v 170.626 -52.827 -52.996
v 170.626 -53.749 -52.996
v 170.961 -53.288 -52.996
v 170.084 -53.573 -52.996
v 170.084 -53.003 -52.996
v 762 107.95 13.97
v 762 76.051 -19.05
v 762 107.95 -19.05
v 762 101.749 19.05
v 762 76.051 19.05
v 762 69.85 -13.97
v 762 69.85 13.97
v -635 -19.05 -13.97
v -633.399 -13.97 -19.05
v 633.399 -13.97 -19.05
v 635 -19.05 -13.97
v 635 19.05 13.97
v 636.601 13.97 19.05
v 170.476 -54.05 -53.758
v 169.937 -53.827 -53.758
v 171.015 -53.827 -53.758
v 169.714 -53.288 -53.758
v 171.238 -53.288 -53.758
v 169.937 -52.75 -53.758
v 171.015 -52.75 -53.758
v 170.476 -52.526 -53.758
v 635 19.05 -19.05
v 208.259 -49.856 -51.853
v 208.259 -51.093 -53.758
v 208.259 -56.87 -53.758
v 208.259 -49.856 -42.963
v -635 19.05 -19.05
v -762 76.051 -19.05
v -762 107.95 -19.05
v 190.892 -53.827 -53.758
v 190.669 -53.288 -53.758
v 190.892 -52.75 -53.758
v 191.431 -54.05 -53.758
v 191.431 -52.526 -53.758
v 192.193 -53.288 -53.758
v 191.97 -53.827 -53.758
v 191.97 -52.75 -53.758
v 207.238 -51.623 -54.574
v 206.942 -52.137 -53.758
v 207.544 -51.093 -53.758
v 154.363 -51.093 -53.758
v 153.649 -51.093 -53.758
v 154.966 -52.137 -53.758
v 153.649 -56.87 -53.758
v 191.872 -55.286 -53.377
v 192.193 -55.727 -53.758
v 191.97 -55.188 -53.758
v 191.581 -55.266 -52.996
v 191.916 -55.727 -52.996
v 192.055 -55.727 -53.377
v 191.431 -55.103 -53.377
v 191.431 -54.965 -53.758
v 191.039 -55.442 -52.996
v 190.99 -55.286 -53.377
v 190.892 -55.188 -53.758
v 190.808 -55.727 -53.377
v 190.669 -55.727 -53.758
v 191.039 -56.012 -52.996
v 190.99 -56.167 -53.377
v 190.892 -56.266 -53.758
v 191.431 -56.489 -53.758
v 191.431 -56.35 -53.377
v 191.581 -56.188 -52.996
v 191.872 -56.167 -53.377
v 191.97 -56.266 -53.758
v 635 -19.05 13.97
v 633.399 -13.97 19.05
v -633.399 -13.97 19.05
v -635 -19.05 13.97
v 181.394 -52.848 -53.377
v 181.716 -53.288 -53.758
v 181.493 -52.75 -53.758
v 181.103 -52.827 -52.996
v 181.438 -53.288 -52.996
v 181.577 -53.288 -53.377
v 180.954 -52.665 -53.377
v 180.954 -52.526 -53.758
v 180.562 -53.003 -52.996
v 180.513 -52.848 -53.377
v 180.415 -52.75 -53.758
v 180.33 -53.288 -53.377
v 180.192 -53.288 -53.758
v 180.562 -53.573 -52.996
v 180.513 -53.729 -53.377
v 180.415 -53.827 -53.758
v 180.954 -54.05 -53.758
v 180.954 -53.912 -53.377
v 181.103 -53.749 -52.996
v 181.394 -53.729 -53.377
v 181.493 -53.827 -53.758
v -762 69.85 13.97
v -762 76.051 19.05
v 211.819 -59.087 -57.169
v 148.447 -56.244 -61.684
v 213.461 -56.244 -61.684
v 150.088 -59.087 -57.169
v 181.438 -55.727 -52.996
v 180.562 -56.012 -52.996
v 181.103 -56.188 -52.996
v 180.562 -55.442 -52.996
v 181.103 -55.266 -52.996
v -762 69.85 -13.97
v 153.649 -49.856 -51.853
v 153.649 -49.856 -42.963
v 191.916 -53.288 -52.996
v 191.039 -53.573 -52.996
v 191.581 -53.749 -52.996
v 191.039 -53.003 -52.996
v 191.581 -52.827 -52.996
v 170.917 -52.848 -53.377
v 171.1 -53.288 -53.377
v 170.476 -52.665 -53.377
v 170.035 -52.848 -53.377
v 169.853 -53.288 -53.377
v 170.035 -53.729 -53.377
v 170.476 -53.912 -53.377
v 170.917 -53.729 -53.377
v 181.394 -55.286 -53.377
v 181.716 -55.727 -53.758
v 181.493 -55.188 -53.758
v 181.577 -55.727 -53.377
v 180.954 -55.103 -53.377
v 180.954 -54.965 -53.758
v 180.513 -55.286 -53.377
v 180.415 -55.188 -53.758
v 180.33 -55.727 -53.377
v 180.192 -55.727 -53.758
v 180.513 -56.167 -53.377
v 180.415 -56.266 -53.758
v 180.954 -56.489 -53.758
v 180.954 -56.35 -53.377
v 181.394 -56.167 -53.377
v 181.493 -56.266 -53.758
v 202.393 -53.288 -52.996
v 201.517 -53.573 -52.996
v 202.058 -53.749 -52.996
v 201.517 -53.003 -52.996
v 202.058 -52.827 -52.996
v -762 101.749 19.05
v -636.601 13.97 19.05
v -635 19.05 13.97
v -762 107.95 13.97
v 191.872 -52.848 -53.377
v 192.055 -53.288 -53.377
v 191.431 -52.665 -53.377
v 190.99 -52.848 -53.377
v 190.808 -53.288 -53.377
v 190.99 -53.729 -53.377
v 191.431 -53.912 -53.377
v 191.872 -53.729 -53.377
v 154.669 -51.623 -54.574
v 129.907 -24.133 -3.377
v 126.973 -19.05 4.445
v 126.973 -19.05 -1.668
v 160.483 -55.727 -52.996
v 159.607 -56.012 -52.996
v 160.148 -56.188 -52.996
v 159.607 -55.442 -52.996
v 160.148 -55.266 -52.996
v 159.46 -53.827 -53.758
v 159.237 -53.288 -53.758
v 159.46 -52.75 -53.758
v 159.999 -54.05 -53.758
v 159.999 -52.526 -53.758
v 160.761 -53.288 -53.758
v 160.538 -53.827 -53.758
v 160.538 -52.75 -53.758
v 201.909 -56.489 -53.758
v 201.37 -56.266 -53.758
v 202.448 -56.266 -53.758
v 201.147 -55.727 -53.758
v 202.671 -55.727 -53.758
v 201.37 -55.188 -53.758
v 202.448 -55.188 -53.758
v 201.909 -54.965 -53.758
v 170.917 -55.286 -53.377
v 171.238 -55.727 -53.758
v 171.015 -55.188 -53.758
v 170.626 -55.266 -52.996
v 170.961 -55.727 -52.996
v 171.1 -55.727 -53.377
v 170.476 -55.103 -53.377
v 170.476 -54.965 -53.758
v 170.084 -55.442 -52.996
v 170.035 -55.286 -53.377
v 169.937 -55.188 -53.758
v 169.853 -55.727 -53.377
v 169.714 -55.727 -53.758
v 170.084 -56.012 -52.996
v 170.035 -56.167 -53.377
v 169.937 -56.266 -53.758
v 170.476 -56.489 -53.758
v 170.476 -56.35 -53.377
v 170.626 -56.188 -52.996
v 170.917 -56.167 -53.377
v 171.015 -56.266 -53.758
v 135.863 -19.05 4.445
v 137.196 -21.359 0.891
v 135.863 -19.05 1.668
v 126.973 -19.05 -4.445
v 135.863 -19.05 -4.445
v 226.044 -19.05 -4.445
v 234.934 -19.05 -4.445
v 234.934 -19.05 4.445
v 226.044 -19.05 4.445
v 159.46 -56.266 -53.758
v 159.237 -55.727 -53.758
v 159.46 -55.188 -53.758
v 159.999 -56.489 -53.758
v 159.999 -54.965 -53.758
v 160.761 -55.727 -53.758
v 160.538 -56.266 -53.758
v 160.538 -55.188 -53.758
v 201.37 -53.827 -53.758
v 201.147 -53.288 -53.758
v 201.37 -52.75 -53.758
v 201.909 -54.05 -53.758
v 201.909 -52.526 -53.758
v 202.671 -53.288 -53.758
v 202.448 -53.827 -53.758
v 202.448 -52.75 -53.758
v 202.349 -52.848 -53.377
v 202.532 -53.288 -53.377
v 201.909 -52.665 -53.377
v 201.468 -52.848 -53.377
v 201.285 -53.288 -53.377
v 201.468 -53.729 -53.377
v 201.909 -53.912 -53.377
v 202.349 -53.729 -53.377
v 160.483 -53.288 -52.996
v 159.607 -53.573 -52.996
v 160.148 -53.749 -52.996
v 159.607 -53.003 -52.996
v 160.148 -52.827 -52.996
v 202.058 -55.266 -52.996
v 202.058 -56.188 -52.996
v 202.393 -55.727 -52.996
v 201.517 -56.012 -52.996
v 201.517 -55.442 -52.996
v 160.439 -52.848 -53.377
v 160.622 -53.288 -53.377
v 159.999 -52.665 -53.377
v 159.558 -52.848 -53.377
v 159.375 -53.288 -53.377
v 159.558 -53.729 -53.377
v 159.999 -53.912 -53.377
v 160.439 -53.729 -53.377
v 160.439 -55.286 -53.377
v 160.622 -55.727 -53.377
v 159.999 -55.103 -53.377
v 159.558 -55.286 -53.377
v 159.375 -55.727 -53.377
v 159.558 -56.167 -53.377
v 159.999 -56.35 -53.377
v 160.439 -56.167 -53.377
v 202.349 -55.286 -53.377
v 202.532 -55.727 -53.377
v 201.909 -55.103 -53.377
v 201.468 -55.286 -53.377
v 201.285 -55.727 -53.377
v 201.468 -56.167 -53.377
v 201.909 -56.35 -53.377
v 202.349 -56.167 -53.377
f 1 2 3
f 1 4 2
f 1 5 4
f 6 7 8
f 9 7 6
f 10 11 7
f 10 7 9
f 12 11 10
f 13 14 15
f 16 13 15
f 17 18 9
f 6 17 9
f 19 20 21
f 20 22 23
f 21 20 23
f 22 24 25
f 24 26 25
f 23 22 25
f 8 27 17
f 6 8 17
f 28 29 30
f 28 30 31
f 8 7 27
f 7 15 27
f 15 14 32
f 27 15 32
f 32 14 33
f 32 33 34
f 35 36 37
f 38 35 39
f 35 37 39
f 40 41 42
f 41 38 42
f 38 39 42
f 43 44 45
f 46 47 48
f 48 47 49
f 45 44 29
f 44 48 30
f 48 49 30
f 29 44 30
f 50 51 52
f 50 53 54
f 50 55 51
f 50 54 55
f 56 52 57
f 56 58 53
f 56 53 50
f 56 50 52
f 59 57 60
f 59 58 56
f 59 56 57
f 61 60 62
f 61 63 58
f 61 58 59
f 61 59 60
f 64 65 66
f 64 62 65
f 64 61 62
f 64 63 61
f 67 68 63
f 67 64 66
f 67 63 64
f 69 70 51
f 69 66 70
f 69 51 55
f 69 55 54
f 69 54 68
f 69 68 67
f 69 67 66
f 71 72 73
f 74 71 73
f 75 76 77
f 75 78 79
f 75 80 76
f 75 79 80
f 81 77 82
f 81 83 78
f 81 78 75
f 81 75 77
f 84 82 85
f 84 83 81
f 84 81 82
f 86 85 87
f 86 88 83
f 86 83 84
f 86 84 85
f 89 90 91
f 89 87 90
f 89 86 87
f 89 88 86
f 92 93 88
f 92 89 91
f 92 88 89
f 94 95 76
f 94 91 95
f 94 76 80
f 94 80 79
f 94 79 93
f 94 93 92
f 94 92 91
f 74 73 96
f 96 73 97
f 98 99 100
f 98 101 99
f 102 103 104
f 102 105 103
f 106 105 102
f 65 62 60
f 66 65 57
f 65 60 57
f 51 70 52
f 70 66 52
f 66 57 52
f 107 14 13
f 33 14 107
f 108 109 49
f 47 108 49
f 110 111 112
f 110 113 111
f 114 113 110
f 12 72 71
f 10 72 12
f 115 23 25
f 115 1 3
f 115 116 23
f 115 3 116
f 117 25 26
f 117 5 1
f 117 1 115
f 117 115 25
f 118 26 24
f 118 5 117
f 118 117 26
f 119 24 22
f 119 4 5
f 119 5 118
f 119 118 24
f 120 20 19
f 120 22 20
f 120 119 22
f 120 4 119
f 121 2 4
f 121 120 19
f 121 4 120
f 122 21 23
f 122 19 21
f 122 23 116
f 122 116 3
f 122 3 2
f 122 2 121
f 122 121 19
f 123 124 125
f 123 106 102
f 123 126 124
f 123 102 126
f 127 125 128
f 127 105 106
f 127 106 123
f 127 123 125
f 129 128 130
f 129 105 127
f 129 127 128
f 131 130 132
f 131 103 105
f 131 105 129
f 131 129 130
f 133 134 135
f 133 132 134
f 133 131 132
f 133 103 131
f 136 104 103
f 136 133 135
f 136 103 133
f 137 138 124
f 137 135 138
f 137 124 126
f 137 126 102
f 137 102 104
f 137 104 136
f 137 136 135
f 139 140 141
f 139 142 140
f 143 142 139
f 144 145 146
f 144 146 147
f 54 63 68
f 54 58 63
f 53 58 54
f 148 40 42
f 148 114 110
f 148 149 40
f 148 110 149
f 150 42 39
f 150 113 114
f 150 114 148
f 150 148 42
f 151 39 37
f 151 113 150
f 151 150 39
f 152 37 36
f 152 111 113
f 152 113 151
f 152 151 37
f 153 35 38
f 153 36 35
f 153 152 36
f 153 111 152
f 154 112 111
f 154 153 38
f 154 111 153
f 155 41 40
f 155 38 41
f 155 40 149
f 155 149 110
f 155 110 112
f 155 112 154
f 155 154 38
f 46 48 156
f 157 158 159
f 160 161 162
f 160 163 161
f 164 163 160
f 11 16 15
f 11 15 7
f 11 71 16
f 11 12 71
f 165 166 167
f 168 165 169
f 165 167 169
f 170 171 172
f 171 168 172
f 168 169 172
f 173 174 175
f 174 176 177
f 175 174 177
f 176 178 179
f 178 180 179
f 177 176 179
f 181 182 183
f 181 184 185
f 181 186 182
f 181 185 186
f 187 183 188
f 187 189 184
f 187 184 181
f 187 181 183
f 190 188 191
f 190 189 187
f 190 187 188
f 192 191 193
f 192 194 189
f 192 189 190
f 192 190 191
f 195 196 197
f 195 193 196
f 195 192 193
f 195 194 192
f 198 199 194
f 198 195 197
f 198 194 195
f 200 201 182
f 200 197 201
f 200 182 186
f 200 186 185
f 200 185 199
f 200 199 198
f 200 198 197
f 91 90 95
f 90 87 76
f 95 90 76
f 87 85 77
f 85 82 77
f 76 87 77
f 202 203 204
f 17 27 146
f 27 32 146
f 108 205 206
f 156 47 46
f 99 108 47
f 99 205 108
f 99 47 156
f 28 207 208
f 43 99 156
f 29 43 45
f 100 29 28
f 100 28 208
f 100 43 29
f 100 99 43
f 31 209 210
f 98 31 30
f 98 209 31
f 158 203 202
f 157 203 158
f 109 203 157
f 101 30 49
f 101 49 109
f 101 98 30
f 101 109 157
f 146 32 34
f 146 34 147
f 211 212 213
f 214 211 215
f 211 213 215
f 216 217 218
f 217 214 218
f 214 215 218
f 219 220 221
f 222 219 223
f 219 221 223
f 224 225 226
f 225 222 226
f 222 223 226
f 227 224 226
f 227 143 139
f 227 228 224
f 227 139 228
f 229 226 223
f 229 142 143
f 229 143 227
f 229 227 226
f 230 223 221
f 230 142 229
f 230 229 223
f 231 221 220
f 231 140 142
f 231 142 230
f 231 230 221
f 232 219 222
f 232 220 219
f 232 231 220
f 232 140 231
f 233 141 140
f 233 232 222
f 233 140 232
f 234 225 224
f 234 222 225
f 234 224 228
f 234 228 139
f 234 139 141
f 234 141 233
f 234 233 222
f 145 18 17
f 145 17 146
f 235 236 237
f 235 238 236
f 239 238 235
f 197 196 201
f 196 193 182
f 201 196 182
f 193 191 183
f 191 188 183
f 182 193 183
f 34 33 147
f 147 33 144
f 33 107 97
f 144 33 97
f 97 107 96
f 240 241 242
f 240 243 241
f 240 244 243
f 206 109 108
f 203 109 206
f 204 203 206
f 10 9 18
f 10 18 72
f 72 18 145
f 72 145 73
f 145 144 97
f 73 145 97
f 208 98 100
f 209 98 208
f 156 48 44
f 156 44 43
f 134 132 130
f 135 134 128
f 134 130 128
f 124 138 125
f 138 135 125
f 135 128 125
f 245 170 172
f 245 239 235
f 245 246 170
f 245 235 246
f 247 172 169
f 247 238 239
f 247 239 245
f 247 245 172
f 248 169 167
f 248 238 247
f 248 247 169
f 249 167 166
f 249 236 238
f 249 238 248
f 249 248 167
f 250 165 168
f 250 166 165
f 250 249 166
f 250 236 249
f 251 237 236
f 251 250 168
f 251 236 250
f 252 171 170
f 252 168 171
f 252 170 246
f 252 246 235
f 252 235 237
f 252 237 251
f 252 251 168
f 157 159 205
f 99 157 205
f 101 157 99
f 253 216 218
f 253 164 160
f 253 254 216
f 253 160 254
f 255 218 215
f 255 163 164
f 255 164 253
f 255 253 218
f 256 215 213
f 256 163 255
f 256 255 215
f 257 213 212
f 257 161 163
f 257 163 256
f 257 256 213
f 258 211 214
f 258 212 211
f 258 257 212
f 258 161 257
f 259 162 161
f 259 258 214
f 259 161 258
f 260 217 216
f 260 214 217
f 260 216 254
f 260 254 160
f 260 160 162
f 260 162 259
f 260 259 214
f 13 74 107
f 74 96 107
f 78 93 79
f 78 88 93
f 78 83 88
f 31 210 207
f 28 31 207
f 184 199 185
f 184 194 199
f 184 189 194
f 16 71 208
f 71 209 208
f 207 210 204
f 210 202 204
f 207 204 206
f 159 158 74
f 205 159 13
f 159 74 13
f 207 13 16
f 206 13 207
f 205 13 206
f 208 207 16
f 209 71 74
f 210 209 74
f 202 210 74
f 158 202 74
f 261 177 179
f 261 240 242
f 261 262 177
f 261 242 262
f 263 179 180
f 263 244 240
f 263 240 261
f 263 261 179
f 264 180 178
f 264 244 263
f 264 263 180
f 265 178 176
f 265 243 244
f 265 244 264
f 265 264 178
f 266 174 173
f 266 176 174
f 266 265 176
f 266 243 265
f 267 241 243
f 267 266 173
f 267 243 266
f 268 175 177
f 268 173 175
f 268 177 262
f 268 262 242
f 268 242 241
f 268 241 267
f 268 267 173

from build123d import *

# Parameters (mm, degrees)
F2_W      = 38.1
F2_H      = 38.1
F6_SIZE   = 5.08
F15_W     = 8.89
F15_H     = 8.89
F20_DEPTH = 76.2
F21_R     = 0.762
F22_DEPTH = 0.762
F22_TAPER = 20


with BuildPart() as f3:
    # F3: sweep along a path in F0
    with BuildLine(Plane.XY) as f3_path:
        Line((635, 0), (762, 88.9))
    # F2 (on plane+point) → F3 (sweep)
    with BuildSketch(Plane.YZ.offset(635)):
        Rectangle(F2_W, F2_H)
    sweep(path=f3_path.line)

    # F4: sweep along a path in F0
    with BuildLine(Plane.XY) as f4_path:
        Line((0, 0), (635, 0))
    # F2 (on plane+point) → F4 (sweep)
    with BuildSketch(Plane.YZ.offset(635)):
        Rectangle(F2_W, F2_H)
    sweep(path=f4_path.line)

    # F5: F3 across plane


with BuildPart() as f3_1:
    add(f3.part)
    add(f3.part.mirror(Plane.YZ))

    # F6
    f6_edges = [f3_1.edges().sort_by_distance(p)[0] for p in [
        (0, -19.05, 19.05),
        (-698.5, 25.4, 19.05),
        (-698.5, 63.5, 19.05),
        (0, 19.05, 19.05),
        (-698.5, 25.4, -19.05),
        (0, -19.05, -19.05),
        (698.5, 25.4, 19.05),
        (698.5, 63.5, 19.05),
        (698.5, 25.4, -19.05),
    ]]
    chamfer(f6_edges, length=F6_SIZE)

    # F17: sweep along a path in F17_path
    with BuildLine(Plane(origin=(230.4893882996, -19.05, 0), x_dir=(0, -0.5448669245, -0.8385225308), z_dir=(0, 0.8385225308, -0.5448669245))) as f17_path:
        Line((0, 0), (66.6308678854, 20.9606761542))
        Line((66.6308678854, 20.9606761542), (66.6308678854, 78.1106761542))
        Line((66.6308678854, 78.1106761542), (0, 99.0713523085))
        Line((0, 99.0713523085), (-9.6917626015, 102.1201779309))
    # F15 (on face) → F17 (sweep)
    with BuildSketch(Plane.XZ.offset(19.05)):
        with Locations((230.4893882996, 0)):
            Rectangle(F15_W, F15_H)
    sweep(path=f17_path.line, transition=Transition.RIGHT)

    # F19 (on face) → F20 (cut)
    with BuildSketch(Plane.XZ.offset(59.0866984684)):
        Polygon((180.9537121453, -41.0576526403), (153.6487121453, -41.0576526403), (153.6487121453, -53.7576526403), (180.9537121453, -53.7576526403), (208.2587121453, -53.7576526403), (208.2587121453, -41.0576526403), align=None)
    extrude(amount=-F20_DEPTH, mode=Mode.SUBTRACT)


with BuildPart() as f22:
    # F21 (on face) → F22 (new body)
    with BuildSketch(Plane.XY.offset(-53.7576526403)):
        with Locations((159.9987121453, -55.7267355194)):
            Circle(F21_R)
    extrude(amount=F22_DEPTH, taper=F22_TAPER)


with BuildPart() as f22b:
    # F21 (on face) → F22, piece 2 (new body)
    with BuildSketch(Plane.XY.offset(-53.7576526403)):
        with Locations((170.4762121453, -55.7267355194)):
            Circle(F21_R)
    extrude(amount=F22_DEPTH, taper=F22_TAPER)


with BuildPart() as f22c:
    # F21 (on face) → F22, piece 3 (new body)
    with BuildSketch(Plane.XY.offset(-53.7576526403)):
        with Locations((180.9537121453, -55.7267355194)):
            Circle(F21_R)
    extrude(amount=F22_DEPTH, taper=F22_TAPER)


with BuildPart() as f22d:
    # F21 (on face) → F22, piece 4 (new body)
    with BuildSketch(Plane.XY.offset(-53.7576526403)):
        with Locations((191.4312121453, -55.7267355194)):
            Circle(F21_R)
    extrude(amount=F22_DEPTH, taper=F22_TAPER)


with BuildPart() as f22e:
    # F21 (on face) → F22, piece 5 (new body)
    with BuildSketch(Plane.XY.offset(-53.7576526403)):
        with Locations((201.9087121453, -55.7267355194)):
            Circle(F21_R)
    extrude(amount=F22_DEPTH, taper=F22_TAPER)


with BuildPart() as f22f:
    # F21 (on face) → F22, piece 6 (new body)
    with BuildSketch(Plane.XY.offset(-53.7576526403)):
        with Locations((159.9987121453, -53.2883355194)):
            Circle(F21_R)
    extrude(amount=F22_DEPTH, taper=F22_TAPER)


with BuildPart() as f22g:
    # F21 (on face) → F22, piece 7 (new body)
    with BuildSketch(Plane.XY.offset(-53.7576526403)):
        with Locations((170.4762119939, -53.2883355194)):
            Circle(F21_R)
    extrude(amount=F22_DEPTH, taper=F22_TAPER)


with BuildPart() as f22h:
    # F21 (on face) → F22, piece 8 (new body)
    with BuildSketch(Plane.XY.offset(-53.7576526403)):
        with Locations((180.9537118425, -53.2883355194)):
            Circle(F21_R)
    extrude(amount=F22_DEPTH, taper=F22_TAPER)


with BuildPart() as f22i:
    # F21 (on face) → F22, piece 9 (new body)
    with BuildSketch(Plane.XY.offset(-53.7576526403)):
        with Locations((191.4312116911, -53.2883355194)):
            Circle(F21_R)
    extrude(amount=F22_DEPTH, taper=F22_TAPER)


with BuildPart() as f22j:
    # F21 (on face) → F22, piece 10 (new body)
    with BuildSketch(Plane.XY.offset(-53.7576526403)):
        with Locations((201.9087115398, -53.2883355194)):
            Circle(F21_R)
    extrude(amount=F22_DEPTH, taper=F22_TAPER)


solid = Compound([f3_1.part, f22.part, f22b.part, f22c.part, f22d.part, f22e.part, f22f.part, f22g.part, f22h.part, f22i.part, f22j.part])
